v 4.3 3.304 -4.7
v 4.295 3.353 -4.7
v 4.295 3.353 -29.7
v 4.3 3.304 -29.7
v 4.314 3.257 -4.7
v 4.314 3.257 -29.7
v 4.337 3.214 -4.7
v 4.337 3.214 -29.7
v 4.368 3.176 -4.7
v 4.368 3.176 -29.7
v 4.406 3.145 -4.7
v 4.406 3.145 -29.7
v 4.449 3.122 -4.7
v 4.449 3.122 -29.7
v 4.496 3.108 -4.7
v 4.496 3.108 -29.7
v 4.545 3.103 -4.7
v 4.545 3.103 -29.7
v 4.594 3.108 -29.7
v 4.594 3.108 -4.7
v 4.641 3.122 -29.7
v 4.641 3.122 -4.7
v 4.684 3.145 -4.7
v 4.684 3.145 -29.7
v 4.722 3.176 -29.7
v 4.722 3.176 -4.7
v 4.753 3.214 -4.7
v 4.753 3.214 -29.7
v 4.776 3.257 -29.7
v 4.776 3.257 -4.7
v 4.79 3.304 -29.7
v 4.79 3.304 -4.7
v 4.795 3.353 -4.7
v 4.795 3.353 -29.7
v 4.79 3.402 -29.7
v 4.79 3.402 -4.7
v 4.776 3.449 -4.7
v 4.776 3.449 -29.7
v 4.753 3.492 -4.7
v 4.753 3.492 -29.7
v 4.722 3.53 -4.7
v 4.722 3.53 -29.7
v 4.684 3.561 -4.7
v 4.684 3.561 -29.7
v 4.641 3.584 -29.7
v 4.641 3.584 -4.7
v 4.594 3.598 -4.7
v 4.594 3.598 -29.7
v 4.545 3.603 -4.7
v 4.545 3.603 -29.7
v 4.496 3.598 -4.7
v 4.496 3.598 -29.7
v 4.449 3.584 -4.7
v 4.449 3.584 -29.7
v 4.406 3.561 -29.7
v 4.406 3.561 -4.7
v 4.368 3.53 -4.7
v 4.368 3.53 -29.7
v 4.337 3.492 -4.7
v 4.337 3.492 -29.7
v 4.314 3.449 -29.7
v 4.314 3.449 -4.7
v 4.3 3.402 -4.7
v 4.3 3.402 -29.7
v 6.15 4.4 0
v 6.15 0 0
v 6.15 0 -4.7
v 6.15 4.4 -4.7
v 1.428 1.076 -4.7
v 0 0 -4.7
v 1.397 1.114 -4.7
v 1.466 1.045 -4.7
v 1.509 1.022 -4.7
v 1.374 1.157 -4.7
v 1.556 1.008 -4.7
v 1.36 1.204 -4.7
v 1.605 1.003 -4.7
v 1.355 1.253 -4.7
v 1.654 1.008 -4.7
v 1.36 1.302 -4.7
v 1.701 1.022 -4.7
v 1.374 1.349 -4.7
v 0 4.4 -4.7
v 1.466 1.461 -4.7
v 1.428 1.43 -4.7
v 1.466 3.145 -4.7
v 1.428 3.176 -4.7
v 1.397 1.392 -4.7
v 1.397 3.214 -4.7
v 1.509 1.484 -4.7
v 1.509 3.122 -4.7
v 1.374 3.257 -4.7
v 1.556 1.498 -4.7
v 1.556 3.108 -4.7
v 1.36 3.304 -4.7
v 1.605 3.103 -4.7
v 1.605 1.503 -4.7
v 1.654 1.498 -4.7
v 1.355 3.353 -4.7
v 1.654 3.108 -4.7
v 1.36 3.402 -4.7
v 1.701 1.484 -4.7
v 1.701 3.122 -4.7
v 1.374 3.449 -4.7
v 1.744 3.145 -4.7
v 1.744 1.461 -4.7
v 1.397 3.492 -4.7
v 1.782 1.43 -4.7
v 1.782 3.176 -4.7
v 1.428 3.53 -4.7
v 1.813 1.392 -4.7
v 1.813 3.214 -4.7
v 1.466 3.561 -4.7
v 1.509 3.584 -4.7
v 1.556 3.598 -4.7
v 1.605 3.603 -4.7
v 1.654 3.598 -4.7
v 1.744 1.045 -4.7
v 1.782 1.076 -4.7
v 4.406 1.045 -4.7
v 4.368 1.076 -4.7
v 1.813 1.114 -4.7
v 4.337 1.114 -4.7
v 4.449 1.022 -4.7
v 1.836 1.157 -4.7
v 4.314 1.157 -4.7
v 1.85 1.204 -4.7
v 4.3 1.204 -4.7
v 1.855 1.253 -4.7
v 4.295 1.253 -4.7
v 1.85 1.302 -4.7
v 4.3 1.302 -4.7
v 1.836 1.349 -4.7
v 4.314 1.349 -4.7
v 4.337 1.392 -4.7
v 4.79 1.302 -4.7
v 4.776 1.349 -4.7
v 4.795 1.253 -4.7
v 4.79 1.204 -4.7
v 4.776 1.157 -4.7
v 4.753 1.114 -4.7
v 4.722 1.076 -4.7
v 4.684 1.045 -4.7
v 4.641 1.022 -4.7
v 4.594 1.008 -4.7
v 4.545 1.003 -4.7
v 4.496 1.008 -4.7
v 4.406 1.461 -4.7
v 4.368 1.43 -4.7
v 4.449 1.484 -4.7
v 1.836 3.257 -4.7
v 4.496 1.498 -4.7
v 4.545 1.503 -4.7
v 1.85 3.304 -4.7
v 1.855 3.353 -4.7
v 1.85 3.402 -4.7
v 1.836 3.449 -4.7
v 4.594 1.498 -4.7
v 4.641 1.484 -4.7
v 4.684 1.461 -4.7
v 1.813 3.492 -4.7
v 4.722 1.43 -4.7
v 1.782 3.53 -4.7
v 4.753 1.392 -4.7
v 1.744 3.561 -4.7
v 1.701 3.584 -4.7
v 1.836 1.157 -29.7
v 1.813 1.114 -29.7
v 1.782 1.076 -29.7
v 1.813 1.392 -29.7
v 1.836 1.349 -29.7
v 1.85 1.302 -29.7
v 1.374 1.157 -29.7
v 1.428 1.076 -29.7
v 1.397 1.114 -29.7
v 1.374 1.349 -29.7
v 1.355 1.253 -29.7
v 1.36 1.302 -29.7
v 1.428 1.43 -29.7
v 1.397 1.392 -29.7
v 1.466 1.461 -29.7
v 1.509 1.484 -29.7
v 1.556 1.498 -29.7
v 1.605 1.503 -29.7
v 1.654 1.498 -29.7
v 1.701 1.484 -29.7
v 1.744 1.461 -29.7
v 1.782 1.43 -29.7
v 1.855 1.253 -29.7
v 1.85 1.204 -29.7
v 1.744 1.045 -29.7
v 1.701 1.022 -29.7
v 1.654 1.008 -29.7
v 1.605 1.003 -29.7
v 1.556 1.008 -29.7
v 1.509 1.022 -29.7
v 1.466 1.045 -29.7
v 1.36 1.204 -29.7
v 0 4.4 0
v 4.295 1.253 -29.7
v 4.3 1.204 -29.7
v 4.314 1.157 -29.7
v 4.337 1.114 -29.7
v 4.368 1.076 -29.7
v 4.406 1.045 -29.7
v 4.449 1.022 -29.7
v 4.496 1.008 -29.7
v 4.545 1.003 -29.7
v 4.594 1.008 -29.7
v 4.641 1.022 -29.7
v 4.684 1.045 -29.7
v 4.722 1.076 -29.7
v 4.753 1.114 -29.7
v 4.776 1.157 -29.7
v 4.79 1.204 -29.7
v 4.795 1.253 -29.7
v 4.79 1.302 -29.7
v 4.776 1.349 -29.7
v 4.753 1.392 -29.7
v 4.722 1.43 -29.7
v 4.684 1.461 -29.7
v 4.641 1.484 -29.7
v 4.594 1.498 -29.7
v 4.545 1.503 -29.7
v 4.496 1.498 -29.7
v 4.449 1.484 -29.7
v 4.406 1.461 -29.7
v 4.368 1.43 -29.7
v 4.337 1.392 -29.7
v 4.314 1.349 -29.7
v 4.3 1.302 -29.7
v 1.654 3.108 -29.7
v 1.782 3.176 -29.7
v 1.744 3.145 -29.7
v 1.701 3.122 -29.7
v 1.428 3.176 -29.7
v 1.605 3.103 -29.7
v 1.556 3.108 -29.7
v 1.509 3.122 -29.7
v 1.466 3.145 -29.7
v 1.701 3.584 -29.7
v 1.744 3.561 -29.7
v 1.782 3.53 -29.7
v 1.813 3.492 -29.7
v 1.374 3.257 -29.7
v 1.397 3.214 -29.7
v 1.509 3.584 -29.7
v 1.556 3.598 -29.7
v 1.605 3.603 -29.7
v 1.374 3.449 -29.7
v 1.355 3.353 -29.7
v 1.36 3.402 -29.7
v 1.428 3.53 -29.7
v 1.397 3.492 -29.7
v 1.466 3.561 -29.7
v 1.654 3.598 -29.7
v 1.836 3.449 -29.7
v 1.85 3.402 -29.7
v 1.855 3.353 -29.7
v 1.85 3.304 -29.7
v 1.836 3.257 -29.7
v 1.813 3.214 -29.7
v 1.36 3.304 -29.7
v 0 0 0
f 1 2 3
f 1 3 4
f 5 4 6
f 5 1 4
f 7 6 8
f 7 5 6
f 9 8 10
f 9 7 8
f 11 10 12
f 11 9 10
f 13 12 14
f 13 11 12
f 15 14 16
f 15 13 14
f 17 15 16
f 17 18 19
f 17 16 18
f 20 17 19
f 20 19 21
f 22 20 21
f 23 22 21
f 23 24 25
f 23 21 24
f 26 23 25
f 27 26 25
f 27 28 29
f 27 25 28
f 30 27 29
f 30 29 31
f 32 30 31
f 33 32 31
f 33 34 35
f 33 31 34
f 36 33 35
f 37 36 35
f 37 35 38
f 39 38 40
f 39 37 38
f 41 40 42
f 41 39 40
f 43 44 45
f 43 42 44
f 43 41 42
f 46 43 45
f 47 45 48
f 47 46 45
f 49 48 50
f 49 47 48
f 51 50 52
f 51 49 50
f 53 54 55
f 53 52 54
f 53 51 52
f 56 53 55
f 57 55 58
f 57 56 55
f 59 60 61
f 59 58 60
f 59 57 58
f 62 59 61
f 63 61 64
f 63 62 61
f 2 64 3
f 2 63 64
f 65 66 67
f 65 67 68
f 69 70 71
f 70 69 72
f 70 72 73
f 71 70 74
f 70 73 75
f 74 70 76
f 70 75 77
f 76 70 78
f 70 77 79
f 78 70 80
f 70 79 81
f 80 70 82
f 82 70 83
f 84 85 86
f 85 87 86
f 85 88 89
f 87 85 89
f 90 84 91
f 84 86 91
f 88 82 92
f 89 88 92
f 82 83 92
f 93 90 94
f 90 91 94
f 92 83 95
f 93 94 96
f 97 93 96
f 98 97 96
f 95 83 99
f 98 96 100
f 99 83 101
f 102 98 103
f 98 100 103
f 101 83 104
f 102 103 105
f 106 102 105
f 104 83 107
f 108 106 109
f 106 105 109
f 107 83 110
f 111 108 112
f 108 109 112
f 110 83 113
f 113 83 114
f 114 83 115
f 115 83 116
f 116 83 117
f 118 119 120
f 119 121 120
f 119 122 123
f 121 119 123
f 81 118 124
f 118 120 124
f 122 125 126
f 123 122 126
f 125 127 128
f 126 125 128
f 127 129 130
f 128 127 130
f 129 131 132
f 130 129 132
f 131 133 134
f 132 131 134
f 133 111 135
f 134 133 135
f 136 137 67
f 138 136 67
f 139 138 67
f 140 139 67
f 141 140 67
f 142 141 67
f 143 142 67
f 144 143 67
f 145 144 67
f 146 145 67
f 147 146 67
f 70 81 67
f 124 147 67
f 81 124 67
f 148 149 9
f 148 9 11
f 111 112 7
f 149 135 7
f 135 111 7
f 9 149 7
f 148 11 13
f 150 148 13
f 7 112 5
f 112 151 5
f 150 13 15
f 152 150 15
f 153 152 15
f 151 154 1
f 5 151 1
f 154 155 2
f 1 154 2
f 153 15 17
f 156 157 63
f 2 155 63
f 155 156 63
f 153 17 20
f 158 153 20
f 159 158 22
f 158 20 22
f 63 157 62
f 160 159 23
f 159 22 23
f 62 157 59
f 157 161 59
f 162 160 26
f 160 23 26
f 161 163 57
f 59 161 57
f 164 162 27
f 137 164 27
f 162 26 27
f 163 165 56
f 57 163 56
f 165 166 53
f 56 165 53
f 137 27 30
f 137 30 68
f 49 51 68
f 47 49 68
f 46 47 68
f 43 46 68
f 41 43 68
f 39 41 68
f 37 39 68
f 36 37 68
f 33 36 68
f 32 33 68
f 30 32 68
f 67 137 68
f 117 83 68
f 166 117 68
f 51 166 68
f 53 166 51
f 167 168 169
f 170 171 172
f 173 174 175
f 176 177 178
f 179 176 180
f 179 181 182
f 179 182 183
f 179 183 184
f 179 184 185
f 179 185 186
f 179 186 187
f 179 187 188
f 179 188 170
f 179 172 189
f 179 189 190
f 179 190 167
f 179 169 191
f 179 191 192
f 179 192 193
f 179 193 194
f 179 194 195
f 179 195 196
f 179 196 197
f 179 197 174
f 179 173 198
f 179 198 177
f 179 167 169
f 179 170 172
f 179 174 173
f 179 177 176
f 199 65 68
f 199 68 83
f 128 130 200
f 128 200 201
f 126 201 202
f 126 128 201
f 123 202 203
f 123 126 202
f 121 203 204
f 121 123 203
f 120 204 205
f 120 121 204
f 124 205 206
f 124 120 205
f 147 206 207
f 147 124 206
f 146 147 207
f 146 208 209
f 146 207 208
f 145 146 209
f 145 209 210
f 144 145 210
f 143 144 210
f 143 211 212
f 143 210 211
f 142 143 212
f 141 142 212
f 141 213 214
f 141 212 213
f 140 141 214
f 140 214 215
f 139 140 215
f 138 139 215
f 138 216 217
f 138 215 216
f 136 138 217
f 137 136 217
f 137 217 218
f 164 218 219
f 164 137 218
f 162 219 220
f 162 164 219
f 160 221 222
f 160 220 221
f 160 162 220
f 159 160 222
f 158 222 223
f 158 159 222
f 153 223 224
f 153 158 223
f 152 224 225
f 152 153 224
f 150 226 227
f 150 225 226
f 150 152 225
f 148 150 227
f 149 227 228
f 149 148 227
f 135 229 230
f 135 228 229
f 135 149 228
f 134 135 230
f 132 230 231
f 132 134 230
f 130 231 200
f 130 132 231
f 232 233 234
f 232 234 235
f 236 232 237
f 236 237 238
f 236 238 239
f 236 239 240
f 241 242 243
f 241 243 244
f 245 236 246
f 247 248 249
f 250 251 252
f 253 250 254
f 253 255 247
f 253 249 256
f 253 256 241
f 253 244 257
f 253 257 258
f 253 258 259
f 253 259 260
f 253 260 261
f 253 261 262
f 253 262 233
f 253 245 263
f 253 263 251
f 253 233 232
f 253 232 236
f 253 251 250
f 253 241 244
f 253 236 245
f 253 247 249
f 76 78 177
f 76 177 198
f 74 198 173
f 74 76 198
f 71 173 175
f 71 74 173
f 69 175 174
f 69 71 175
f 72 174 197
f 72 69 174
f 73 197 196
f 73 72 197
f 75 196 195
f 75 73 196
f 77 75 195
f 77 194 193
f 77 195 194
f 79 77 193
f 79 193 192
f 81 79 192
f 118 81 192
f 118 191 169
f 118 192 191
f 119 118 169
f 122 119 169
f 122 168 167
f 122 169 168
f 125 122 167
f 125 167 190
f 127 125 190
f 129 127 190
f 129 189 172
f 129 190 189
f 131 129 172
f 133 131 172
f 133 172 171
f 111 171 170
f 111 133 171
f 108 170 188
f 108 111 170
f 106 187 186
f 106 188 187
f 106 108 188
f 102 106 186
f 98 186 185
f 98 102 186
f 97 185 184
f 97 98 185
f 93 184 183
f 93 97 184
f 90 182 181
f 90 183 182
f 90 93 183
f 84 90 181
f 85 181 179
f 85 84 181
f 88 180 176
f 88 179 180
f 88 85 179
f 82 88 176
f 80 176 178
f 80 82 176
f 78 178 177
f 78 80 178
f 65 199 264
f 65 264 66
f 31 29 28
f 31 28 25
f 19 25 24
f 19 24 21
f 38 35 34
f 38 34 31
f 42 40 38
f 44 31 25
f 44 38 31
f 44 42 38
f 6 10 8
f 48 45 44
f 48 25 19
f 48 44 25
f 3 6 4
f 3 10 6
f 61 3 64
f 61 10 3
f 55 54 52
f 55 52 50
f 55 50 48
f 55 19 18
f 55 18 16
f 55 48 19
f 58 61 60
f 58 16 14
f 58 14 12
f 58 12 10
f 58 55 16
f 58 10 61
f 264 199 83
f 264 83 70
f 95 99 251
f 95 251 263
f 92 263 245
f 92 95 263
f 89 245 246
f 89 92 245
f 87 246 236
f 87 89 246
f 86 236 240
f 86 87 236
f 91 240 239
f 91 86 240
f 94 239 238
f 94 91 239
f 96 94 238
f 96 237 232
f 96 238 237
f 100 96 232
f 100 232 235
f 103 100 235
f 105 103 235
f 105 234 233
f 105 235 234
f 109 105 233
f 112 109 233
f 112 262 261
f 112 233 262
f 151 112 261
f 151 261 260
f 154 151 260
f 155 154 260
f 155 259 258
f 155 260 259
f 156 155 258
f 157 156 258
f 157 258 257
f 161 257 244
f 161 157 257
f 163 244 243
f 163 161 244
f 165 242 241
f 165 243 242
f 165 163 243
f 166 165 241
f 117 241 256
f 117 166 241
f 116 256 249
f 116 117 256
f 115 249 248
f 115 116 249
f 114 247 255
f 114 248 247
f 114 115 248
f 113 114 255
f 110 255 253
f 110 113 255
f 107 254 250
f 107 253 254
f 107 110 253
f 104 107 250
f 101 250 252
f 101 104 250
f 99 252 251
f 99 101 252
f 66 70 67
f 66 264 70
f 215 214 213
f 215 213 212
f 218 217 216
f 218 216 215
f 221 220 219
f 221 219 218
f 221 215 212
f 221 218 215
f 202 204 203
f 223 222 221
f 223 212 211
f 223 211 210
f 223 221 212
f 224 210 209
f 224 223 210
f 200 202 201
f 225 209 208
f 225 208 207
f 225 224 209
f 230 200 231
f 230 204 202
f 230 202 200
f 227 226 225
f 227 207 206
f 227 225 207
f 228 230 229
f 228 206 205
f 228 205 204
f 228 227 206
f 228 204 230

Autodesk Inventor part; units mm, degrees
ref_plane "YZ Plane" through (0, 0, 0) normal (1, 0, 0) x (0, 1, 0)
ref_plane "XZ Plane" through (0, 0, 0) normal (0, 1, 0) x (-1, 0, 0)
ref_plane "XY Plane" through (0, 0, 0) normal (0, 0, 1) x (1, 0, 0)
sketch "Sketch1" plane through (0, 0, 0) normal (0, 0, 1) x (1, 0, 0)
  line L0 (0, 0) -> (6.15, 0)
  line L1 (6.15, 0) -> (6.15, 4.4)
  line L2 (6.15, 4.4) -> (0, 4.4)
  line L3 (0, 4.4) -> (0, 0)
  dimension "d0" = 6.15
  dimension "d1" = 4.4
extrude "Extrusion1" add sketch "Sketch1" against normal blind 4.7
sketch "Sketch2" plane through (0, 0, -4.7) normal (0, 0, -1) x (-1, 0, 0)
  line L0 (-6.15, 0) -> (-6.15, 4.4) projected
  line L1 (0, 4.4) -> (0, 0) projected
  line L2 (-6.15, 4.4) -> (0, 4.4) projected
  circle A0 centre (-4.545, 3.353) radius 0.25
  circle A1 centre (-1.605, 3.353) radius 0.25
  circle A2 centre (-4.545, 1.253) radius 0.25
  circle A3 centre (-1.605, 1.253) radius 0.25
  dimension "d4" = 0.5
  dimension "d5" = 0.5
  dimension "d6" = 0.5
  dimension "d7" = 0.5
  dimension "d8" = 3.44
  dimension "d9" = 3.44
  dimension "d10" = 2.6
  dimension "d11" = 2.6
  dimension "d12" = 1.605
  dimension "d13" = 1.605
  dimension "d14" = 1.605
  dimension "d15" = 1.047
extrude "Extrusion2" add sketch "Sketch2" along normal blind 25
properties part number "LineSensor"
